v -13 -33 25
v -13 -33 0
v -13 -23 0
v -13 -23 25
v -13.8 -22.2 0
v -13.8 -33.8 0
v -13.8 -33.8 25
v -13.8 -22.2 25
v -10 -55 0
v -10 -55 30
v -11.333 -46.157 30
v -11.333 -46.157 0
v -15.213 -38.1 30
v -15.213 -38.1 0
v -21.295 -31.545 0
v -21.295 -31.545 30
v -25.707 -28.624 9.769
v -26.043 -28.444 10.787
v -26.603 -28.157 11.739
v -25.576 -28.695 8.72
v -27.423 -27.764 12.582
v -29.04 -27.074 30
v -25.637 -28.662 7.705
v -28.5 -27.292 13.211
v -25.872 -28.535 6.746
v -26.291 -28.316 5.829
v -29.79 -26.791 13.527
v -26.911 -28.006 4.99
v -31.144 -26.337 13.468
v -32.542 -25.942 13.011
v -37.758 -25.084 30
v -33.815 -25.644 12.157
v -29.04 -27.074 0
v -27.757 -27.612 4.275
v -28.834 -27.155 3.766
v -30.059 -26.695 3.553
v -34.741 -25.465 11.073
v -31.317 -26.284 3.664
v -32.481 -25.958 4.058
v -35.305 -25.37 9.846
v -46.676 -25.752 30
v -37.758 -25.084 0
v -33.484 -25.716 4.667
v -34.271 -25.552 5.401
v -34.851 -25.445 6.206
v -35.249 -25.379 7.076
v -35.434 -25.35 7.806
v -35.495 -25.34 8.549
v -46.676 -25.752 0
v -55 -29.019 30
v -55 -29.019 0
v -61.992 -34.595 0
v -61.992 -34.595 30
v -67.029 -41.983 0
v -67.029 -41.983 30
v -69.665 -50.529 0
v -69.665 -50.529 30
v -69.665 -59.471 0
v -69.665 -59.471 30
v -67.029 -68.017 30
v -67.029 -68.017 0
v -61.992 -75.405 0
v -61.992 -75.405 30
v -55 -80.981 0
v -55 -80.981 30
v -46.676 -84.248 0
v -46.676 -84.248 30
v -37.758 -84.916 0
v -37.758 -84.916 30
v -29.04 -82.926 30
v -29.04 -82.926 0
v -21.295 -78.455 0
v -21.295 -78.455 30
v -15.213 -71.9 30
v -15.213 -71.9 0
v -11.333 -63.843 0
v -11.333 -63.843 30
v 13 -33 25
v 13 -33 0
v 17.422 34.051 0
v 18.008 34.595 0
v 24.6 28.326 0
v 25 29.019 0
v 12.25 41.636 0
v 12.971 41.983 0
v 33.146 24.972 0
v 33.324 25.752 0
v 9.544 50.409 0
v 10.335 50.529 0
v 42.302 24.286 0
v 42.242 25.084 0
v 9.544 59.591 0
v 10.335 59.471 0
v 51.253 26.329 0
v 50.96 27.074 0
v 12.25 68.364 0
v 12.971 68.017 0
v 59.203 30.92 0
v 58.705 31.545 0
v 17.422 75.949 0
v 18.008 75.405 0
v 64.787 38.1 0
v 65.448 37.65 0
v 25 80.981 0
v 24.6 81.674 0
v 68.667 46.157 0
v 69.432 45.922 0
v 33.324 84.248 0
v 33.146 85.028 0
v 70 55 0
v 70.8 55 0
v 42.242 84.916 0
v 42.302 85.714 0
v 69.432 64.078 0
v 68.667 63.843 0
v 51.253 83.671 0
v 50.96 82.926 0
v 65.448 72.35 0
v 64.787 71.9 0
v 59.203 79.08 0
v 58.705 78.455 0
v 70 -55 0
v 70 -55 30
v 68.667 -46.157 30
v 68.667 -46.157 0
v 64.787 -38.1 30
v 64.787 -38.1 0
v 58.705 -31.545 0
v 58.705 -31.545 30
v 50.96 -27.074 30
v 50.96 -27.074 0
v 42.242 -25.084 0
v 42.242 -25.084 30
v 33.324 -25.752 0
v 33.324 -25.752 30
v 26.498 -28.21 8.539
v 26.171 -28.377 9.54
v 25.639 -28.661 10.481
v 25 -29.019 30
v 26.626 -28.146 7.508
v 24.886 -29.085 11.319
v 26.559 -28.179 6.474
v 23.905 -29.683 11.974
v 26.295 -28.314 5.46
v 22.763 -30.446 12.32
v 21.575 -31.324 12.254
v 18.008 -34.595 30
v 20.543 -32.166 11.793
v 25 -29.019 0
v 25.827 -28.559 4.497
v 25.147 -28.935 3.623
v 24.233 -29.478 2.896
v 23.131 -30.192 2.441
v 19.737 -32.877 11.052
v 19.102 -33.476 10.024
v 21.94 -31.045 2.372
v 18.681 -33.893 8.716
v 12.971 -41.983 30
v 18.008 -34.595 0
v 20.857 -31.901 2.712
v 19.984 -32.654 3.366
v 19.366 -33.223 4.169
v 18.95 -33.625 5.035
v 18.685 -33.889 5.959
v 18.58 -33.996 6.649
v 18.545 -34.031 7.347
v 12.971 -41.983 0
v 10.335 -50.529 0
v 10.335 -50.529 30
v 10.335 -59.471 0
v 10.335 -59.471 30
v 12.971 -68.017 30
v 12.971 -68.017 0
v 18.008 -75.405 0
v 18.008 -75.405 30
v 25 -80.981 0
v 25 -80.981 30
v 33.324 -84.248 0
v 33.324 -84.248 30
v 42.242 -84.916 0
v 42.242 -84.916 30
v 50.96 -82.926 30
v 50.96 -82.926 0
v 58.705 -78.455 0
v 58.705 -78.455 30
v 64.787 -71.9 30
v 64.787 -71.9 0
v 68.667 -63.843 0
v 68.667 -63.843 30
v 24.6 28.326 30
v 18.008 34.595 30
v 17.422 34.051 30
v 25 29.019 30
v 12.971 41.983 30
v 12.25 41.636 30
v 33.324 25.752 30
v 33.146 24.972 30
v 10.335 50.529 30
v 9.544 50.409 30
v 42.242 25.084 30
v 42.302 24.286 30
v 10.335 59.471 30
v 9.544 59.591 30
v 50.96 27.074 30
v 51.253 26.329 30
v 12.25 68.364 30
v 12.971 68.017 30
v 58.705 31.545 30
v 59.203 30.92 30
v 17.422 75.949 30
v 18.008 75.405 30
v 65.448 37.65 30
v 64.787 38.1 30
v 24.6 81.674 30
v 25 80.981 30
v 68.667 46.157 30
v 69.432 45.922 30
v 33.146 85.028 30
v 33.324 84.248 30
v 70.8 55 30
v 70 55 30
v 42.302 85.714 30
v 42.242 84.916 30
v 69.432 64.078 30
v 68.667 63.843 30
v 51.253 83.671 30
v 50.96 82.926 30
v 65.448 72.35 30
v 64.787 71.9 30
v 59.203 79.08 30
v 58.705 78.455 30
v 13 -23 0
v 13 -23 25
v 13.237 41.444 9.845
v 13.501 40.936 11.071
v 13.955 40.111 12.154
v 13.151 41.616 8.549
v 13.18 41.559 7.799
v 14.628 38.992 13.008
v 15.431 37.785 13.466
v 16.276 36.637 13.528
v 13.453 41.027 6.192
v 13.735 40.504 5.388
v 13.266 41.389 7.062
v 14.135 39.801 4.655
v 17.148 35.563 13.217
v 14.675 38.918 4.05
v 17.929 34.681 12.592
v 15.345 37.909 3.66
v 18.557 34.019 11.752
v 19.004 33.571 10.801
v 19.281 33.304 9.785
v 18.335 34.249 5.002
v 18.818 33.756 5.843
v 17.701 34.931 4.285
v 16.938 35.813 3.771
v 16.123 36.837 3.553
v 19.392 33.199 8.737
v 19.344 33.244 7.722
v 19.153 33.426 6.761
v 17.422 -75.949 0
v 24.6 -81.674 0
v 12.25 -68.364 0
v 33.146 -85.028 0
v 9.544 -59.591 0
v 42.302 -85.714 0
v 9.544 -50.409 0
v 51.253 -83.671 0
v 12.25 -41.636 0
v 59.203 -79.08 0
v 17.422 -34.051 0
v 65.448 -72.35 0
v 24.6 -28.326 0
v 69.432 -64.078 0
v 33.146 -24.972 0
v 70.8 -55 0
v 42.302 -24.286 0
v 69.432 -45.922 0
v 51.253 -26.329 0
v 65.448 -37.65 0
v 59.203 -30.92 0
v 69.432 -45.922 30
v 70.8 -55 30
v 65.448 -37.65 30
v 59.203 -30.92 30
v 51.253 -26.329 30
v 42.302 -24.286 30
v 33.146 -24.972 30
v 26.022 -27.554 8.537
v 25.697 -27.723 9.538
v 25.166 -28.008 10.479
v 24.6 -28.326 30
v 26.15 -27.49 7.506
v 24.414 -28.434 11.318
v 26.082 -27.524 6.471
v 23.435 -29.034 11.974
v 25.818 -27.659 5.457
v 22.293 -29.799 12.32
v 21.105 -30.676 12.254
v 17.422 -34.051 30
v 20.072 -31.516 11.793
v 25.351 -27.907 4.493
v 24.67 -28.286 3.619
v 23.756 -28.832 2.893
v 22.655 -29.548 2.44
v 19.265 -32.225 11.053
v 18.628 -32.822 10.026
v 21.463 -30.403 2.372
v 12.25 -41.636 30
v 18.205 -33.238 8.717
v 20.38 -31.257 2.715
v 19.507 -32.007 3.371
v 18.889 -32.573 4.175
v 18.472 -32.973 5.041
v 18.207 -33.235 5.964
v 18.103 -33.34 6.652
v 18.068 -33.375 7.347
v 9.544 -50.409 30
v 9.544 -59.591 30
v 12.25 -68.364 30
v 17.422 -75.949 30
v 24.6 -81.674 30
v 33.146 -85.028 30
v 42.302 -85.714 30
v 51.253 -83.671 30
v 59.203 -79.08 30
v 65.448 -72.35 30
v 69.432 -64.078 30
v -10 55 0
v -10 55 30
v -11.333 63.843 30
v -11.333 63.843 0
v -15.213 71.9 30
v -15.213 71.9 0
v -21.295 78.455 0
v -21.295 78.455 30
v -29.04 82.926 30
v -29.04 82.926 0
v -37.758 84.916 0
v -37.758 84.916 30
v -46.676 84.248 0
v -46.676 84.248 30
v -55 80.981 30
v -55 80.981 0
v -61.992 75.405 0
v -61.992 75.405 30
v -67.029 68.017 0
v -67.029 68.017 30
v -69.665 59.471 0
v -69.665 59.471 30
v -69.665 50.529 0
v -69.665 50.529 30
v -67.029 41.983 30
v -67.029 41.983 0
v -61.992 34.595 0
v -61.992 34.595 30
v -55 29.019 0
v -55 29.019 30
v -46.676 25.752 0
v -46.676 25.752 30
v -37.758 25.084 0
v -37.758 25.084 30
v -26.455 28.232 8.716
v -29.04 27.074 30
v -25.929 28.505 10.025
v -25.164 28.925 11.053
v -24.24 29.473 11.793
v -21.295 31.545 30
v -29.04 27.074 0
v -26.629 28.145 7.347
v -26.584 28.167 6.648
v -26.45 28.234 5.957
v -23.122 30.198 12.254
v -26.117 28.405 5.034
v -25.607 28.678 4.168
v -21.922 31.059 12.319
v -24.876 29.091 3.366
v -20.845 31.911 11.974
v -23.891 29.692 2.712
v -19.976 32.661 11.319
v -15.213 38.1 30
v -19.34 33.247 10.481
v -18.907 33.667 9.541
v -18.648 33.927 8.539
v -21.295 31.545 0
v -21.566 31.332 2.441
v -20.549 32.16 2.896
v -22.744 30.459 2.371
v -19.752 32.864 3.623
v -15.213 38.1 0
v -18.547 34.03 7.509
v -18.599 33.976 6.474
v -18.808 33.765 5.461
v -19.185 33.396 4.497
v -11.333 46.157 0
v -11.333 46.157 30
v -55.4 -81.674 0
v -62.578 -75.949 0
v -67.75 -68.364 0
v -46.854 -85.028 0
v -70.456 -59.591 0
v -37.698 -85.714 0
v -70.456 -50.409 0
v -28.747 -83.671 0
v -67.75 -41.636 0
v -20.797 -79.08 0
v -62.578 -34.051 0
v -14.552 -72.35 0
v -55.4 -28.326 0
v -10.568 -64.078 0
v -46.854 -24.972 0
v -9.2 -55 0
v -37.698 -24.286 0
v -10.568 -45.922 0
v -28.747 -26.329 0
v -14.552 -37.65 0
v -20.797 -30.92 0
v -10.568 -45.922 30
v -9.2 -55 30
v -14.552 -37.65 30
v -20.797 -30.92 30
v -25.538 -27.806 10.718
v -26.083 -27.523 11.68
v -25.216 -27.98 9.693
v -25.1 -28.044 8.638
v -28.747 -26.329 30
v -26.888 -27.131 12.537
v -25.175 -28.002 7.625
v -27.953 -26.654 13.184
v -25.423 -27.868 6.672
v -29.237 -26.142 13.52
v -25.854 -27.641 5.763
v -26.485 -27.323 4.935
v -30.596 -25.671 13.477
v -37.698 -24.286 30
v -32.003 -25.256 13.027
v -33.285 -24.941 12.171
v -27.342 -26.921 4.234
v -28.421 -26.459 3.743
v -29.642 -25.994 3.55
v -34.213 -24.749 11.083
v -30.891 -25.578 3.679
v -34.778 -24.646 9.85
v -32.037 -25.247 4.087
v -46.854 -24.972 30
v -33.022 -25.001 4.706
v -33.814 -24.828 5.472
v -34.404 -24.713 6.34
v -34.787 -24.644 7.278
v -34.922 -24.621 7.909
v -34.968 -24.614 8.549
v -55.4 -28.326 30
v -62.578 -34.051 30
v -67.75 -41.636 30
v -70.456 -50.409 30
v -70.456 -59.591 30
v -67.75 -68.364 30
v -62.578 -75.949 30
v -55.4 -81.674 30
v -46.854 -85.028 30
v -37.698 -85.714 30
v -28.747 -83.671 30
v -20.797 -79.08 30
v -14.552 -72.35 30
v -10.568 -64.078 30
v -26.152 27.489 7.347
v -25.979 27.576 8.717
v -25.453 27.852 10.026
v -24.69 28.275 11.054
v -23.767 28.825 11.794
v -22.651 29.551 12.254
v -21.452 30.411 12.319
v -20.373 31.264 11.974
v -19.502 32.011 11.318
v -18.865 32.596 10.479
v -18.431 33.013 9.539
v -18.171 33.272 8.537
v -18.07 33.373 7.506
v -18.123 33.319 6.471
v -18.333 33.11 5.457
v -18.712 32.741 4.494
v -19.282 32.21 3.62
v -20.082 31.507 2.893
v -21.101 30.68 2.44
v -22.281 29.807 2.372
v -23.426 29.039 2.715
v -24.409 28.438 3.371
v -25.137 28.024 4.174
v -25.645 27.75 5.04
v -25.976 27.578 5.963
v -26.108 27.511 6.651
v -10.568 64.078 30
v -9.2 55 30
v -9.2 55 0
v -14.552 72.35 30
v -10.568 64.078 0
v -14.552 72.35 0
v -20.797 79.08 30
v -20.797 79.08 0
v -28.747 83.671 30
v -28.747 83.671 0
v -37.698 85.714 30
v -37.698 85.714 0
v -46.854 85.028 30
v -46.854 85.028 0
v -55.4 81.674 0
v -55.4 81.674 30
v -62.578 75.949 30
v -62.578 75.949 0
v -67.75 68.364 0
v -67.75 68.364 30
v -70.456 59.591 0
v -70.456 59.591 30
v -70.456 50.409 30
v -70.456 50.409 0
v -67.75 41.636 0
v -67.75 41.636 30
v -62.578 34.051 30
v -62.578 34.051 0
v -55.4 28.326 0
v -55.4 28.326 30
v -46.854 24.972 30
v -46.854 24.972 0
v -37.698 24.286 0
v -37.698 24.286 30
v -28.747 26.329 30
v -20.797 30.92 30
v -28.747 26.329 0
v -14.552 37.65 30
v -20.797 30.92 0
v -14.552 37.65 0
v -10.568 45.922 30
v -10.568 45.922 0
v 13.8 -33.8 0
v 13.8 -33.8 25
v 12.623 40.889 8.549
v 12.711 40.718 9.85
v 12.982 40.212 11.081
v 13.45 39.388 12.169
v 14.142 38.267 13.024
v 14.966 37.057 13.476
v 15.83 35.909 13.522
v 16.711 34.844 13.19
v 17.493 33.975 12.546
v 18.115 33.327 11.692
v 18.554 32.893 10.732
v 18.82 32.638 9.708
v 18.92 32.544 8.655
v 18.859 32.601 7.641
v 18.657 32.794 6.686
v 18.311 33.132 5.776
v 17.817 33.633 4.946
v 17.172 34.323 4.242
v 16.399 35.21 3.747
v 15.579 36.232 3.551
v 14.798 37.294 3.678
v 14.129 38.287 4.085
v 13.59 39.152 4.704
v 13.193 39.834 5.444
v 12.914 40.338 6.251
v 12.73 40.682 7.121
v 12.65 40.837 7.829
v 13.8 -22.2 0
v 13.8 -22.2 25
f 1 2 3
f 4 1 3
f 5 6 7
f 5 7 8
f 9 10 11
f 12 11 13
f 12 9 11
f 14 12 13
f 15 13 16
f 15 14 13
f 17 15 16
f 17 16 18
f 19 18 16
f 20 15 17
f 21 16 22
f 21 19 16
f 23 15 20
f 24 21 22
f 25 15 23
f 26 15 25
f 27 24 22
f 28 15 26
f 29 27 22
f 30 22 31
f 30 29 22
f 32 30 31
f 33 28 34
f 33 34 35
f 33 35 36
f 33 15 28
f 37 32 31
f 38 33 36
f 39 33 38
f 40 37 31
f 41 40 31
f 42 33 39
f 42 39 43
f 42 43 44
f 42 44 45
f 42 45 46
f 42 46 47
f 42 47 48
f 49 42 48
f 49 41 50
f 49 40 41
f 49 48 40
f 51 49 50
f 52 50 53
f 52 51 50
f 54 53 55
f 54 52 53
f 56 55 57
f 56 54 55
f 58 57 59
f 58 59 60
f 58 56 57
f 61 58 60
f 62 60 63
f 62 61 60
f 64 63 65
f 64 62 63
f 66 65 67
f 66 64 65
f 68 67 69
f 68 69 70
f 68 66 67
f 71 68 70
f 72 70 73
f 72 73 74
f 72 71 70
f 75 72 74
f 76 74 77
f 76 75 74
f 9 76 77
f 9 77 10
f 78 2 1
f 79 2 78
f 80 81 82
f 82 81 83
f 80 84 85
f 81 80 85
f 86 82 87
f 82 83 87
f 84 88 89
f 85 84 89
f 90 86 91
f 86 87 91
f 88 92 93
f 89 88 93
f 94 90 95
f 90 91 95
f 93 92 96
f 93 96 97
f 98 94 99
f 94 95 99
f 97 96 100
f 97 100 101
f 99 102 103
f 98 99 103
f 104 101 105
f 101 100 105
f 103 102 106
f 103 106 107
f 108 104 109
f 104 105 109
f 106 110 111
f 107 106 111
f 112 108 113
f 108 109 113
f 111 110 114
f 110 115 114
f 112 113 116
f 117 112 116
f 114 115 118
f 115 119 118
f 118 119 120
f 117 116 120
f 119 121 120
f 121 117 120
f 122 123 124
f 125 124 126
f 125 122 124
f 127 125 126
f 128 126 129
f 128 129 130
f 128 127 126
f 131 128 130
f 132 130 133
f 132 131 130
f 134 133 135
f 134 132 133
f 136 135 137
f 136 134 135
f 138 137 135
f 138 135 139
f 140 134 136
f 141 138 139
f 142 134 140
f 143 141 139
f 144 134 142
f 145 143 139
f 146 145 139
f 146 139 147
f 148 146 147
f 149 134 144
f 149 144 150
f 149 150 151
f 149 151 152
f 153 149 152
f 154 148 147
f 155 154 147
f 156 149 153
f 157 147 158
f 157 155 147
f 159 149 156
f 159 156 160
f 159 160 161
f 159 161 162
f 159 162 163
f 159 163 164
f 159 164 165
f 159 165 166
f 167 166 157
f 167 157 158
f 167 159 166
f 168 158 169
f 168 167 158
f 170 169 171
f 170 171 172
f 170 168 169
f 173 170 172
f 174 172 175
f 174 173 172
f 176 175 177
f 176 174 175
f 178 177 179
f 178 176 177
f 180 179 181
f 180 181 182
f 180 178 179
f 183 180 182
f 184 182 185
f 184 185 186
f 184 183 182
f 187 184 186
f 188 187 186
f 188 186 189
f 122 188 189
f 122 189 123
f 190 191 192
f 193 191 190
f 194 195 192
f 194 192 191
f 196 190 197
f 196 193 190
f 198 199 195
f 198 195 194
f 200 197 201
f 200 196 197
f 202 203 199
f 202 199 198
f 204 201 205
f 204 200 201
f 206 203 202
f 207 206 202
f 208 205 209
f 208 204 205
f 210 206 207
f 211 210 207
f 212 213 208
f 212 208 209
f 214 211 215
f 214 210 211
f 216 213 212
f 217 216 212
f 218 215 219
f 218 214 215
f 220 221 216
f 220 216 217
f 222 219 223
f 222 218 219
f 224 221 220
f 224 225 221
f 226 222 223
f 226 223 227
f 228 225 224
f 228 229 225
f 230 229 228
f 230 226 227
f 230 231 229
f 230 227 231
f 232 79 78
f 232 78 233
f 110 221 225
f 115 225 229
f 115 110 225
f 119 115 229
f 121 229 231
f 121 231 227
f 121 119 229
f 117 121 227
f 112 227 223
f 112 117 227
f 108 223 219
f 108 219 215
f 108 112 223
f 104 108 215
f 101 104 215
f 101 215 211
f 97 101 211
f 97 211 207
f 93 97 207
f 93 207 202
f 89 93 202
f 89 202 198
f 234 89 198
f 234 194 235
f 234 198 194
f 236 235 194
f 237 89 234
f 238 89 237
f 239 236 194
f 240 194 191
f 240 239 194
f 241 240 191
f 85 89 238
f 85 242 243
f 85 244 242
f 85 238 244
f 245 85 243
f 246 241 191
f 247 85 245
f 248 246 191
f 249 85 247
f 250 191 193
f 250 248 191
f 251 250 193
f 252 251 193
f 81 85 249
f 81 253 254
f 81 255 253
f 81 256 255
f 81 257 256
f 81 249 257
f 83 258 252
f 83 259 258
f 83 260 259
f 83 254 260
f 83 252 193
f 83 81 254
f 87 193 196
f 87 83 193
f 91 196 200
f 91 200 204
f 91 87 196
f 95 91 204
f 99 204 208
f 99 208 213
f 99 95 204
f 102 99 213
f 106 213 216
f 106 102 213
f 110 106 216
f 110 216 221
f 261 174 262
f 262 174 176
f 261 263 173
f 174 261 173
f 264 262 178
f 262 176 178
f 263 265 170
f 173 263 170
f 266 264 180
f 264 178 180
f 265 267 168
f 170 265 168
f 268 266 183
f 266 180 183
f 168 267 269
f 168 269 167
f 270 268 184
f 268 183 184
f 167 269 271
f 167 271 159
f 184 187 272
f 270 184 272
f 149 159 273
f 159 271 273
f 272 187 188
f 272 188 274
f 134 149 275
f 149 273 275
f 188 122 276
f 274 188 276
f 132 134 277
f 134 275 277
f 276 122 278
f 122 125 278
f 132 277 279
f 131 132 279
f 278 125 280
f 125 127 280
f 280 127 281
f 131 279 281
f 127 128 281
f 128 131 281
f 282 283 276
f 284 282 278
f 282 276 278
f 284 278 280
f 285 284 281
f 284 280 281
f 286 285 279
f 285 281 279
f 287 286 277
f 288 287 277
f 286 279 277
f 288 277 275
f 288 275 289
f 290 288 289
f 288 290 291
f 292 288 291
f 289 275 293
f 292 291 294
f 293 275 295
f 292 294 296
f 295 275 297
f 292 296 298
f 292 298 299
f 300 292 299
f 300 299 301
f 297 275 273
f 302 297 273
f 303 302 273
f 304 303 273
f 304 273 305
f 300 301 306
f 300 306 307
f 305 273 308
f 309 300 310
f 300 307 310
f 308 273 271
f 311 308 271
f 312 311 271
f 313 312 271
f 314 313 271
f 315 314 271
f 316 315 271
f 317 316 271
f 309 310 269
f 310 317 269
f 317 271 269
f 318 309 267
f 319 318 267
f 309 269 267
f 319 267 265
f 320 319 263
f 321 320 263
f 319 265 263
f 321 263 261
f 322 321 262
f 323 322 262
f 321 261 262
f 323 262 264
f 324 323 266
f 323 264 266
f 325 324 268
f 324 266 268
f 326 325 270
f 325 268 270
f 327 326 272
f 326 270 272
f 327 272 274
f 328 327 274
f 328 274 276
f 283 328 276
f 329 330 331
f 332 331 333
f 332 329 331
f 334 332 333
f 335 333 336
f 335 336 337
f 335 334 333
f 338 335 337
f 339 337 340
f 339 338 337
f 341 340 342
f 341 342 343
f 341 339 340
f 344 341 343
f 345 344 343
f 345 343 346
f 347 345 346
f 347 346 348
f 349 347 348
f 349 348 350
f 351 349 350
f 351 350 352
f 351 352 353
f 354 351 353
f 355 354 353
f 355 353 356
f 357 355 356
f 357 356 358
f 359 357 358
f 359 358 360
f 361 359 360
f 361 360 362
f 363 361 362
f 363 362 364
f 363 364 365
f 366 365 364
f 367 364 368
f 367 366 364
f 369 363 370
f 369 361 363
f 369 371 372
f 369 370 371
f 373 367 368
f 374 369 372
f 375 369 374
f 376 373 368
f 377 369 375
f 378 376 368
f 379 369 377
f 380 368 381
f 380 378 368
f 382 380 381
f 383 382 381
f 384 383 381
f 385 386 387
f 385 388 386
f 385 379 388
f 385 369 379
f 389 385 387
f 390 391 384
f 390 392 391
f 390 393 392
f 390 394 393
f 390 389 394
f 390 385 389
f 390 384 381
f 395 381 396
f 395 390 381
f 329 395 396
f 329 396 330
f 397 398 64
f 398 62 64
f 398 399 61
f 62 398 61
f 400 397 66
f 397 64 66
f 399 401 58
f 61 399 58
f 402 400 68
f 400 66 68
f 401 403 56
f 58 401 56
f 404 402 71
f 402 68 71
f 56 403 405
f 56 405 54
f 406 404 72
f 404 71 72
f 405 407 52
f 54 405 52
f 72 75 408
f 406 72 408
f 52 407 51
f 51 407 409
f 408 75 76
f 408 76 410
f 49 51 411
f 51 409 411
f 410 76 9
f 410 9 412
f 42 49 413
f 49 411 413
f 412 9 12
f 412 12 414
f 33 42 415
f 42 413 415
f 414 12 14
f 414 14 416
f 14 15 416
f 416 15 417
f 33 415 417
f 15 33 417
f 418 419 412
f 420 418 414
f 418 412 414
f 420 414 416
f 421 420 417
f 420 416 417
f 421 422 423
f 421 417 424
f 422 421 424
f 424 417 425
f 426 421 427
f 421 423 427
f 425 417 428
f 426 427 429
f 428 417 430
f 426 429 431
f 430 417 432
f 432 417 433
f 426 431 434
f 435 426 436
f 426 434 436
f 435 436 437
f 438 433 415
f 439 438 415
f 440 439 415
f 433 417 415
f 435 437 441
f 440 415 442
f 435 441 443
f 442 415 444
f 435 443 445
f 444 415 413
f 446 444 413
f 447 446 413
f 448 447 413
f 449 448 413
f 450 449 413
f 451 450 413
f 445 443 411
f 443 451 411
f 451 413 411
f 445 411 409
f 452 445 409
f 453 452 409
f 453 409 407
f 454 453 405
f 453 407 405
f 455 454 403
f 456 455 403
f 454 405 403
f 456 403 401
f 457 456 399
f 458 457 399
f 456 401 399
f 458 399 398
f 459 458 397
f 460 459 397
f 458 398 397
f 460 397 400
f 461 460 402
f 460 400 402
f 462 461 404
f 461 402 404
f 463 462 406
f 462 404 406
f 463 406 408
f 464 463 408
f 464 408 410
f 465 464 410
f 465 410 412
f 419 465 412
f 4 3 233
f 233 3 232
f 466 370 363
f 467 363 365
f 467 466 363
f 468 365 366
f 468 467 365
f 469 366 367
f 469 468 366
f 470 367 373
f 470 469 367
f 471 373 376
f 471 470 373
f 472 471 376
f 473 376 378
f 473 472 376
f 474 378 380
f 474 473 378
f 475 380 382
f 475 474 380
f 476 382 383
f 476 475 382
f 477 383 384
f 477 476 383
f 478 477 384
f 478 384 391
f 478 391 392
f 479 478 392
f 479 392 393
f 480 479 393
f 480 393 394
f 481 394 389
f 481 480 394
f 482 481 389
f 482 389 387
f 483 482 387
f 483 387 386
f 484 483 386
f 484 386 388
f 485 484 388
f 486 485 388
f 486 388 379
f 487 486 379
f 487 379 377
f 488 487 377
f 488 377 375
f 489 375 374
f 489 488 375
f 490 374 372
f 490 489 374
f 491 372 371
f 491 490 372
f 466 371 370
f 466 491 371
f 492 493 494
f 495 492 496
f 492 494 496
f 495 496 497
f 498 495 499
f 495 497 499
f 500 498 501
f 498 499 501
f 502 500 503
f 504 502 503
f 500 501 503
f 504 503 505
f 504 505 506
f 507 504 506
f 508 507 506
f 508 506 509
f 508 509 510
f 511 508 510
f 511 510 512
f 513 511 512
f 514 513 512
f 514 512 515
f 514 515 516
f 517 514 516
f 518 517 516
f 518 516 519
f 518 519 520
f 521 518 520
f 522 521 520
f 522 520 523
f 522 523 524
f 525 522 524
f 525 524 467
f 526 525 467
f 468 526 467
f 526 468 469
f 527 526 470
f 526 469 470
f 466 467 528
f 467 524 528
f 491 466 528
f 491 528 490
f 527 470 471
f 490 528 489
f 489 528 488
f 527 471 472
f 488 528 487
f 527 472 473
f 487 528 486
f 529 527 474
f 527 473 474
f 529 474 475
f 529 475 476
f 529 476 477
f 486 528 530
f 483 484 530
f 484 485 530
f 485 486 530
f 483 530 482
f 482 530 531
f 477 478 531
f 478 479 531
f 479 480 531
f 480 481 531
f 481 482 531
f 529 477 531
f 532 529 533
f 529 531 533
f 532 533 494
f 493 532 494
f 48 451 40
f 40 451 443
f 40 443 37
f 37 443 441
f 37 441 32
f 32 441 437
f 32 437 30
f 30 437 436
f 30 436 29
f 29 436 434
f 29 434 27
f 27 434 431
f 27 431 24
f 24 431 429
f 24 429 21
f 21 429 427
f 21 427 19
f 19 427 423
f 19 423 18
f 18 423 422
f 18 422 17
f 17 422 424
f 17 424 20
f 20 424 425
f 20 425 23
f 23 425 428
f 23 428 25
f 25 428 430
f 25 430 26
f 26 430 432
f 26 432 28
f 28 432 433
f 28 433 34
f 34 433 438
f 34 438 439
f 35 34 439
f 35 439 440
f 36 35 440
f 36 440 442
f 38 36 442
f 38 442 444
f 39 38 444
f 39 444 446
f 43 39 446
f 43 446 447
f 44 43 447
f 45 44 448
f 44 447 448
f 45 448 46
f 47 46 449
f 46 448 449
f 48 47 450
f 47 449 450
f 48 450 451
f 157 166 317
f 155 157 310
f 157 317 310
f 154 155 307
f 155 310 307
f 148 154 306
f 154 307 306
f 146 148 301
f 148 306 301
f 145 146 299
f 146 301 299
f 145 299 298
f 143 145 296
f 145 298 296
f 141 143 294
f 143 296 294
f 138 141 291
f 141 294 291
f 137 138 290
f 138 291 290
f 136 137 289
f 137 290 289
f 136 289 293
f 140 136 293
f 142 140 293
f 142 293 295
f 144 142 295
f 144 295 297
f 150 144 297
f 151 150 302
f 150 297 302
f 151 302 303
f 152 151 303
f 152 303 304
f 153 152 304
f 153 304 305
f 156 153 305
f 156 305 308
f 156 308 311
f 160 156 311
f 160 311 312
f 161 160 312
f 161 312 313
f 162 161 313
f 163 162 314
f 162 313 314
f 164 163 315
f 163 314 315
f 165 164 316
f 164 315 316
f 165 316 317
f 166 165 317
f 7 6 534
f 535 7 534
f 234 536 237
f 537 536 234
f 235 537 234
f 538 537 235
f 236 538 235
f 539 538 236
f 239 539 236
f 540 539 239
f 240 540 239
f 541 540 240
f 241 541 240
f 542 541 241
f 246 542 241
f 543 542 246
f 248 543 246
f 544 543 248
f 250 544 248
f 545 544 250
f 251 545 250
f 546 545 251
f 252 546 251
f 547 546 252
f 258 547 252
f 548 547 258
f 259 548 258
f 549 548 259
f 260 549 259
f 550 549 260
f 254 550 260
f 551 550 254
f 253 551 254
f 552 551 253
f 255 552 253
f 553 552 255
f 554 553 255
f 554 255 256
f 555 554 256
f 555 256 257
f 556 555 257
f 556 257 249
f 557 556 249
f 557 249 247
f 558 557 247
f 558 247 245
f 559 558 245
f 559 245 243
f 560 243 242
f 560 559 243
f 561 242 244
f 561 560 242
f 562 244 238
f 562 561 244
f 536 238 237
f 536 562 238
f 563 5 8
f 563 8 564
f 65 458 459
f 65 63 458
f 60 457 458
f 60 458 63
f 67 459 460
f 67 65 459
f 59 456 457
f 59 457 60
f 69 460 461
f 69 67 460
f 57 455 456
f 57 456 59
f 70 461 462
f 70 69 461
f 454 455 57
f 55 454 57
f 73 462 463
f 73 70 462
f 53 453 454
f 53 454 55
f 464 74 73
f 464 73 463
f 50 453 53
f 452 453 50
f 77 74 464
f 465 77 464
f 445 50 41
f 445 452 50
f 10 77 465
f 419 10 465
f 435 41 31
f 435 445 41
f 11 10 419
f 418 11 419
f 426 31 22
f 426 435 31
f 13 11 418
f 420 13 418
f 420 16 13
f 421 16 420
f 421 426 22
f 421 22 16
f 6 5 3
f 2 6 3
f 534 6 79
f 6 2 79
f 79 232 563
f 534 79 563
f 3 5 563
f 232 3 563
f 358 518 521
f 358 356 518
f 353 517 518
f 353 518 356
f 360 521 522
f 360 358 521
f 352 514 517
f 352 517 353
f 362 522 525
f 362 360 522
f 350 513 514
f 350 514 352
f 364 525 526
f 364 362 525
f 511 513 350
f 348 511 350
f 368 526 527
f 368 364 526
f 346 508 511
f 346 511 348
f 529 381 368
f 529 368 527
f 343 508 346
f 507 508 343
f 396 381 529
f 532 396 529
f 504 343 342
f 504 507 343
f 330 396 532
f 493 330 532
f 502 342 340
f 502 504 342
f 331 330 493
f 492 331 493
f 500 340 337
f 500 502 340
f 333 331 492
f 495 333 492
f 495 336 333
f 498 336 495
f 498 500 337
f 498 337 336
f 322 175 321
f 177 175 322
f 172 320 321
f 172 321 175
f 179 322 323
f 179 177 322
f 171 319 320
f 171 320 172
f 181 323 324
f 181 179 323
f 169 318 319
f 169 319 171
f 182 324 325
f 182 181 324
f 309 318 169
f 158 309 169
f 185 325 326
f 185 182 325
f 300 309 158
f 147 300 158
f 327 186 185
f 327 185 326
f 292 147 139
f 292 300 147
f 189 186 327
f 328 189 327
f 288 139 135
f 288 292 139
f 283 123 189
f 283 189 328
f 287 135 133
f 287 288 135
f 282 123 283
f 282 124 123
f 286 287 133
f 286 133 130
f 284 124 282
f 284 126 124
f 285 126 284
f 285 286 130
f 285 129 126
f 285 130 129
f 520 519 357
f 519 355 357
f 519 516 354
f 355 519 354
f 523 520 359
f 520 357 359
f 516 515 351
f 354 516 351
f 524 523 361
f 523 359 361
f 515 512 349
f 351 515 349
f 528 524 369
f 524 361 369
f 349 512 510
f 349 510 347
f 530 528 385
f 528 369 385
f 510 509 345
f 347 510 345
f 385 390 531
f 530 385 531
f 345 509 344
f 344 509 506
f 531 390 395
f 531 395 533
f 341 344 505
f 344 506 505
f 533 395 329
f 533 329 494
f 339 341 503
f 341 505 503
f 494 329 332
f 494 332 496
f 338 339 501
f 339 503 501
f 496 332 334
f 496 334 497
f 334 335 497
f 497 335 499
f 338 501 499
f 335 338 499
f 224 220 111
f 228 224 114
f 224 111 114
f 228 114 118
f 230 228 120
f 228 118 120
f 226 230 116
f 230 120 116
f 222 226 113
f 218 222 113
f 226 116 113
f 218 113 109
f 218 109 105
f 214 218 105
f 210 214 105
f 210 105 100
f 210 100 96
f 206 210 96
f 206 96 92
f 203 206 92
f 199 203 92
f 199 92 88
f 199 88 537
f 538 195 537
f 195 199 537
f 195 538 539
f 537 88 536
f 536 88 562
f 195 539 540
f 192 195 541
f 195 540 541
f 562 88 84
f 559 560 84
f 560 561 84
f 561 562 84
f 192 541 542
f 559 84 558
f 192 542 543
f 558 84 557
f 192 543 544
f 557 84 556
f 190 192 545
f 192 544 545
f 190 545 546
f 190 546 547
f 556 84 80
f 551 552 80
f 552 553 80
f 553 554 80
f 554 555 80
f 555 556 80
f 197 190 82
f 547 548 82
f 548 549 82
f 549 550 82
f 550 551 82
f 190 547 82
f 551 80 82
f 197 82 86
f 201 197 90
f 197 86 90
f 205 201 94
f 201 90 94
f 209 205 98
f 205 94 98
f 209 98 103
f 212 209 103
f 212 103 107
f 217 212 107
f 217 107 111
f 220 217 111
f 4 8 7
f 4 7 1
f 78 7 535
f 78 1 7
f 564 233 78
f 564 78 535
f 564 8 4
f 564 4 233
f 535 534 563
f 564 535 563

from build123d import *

# Parameters (mm, degrees)
F0_R          = 30.8
F0_R_2        = 30
F1_DEPTH      = 30
F4_R          = 5
F5_DEPTH      = 60
F5_DEPTH_BACK = 60
F7_R          = 5
F8_DEPTH      = 50
F8_DEPTH_BACK = 50
F9_W          = 27.6
F9_H          = 11.6
F9_W_2        = 26
F9_H_2        = 10
F10_DEPTH     = 25


with BuildPart() as f1:
    # F0 (on Top) → F1 (new body)
    with BuildSketch(Plane.XY):
        with Locations((-40, 55)):
            Circle(F0_R)
        with Locations((-40, 55)):
            Circle(F0_R_2, mode=Mode.SUBTRACT)
    extrude(amount=F1_DEPTH)


with BuildPart() as f1b:
    # F0 (on Top) → F1, piece 2 (new body)
    with BuildSketch(Plane.XY):
        with Locations((40, 55)):
            Circle(F0_R)
        with Locations((40, 55)):
            Circle(F0_R_2, mode=Mode.SUBTRACT)
    extrude(amount=F1_DEPTH)


with BuildPart() as f1c:
    # F0 (on Top) → F1, piece 3 (new body)
    with BuildSketch(Plane.XY):
        with Locations((-40, -55)):
            Circle(F0_R)
        with Locations((-40, -55)):
            Circle(F0_R_2, mode=Mode.SUBTRACT)
    extrude(amount=F1_DEPTH)


with BuildPart() as f1d:
    # F0 (on Top) → F1, piece 4 (new body)
    with BuildSketch(Plane.XY):
        with Locations((40, -55)):
            Circle(F0_R)
        with Locations((40, -55)):
            Circle(F0_R_2, mode=Mode.SUBTRACT)
    extrude(amount=F1_DEPTH)


with BuildPart() as f5_tool:
    # F4 (on line) → F5 (new body, two sides)
    with BuildSketch(Plane(origin=(0, 0, 0), x_dir=(-0.8090169944, -0.5877852523, 0), z_dir=(-0.5877852523, 0.8090169944, 0))) as f5_sk:
        with Locations((0, 7.3466342874)):
            Circle(F4_R)
    extrude(amount=-F5_DEPTH)
    extrude(f5_sk.sketch, amount=F5_DEPTH_BACK)


with BuildPart() as f1_1:
    add(f1.part)

    # F5: cut by f5_tool
    add(f5_tool.part, mode=Mode.SUBTRACT)


with BuildPart() as f1d_1:
    add(f1d.part)

    # F5: cut by f5_tool
    add(f5_tool.part, mode=Mode.SUBTRACT)


with BuildPart() as f8_tool:
    # F7 (on line) → F8 (new body, two sides)
    with BuildSketch(Plane(origin=(0, 0, 0), x_dir=(-0.8090169944, 0.5877852523, 0), z_dir=(0.5877852523, 0.8090169944, 0))) as f8_sk:
        with Locations((8.8217863813, 8.5488967597)):
            Circle(F7_R)
    extrude(amount=-F8_DEPTH)
    extrude(f8_sk.sketch, amount=F8_DEPTH_BACK)


with BuildPart() as f1b_1:
    add(f1b.part)

    # F8: cut by f8_tool
    add(f8_tool.part, mode=Mode.SUBTRACT)


with BuildPart() as f1c_1:
    add(f1c.part)

    # F8: cut by f8_tool
    add(f8_tool.part, mode=Mode.SUBTRACT)


with BuildPart() as f10:
    # F9 (on Top) → F10 (new body)
    with BuildSketch(Plane.XY):
        with Locations((0, -28)):
            Rectangle(F9_W, F9_H)
        with Locations((0, -28)):
            Rectangle(F9_W_2, F9_H_2, mode=Mode.SUBTRACT)
    extrude(amount=F10_DEPTH)


solid = Compound([f1_1.part, f1d_1.part, f1b_1.part, f1c_1.part, f10.part])
